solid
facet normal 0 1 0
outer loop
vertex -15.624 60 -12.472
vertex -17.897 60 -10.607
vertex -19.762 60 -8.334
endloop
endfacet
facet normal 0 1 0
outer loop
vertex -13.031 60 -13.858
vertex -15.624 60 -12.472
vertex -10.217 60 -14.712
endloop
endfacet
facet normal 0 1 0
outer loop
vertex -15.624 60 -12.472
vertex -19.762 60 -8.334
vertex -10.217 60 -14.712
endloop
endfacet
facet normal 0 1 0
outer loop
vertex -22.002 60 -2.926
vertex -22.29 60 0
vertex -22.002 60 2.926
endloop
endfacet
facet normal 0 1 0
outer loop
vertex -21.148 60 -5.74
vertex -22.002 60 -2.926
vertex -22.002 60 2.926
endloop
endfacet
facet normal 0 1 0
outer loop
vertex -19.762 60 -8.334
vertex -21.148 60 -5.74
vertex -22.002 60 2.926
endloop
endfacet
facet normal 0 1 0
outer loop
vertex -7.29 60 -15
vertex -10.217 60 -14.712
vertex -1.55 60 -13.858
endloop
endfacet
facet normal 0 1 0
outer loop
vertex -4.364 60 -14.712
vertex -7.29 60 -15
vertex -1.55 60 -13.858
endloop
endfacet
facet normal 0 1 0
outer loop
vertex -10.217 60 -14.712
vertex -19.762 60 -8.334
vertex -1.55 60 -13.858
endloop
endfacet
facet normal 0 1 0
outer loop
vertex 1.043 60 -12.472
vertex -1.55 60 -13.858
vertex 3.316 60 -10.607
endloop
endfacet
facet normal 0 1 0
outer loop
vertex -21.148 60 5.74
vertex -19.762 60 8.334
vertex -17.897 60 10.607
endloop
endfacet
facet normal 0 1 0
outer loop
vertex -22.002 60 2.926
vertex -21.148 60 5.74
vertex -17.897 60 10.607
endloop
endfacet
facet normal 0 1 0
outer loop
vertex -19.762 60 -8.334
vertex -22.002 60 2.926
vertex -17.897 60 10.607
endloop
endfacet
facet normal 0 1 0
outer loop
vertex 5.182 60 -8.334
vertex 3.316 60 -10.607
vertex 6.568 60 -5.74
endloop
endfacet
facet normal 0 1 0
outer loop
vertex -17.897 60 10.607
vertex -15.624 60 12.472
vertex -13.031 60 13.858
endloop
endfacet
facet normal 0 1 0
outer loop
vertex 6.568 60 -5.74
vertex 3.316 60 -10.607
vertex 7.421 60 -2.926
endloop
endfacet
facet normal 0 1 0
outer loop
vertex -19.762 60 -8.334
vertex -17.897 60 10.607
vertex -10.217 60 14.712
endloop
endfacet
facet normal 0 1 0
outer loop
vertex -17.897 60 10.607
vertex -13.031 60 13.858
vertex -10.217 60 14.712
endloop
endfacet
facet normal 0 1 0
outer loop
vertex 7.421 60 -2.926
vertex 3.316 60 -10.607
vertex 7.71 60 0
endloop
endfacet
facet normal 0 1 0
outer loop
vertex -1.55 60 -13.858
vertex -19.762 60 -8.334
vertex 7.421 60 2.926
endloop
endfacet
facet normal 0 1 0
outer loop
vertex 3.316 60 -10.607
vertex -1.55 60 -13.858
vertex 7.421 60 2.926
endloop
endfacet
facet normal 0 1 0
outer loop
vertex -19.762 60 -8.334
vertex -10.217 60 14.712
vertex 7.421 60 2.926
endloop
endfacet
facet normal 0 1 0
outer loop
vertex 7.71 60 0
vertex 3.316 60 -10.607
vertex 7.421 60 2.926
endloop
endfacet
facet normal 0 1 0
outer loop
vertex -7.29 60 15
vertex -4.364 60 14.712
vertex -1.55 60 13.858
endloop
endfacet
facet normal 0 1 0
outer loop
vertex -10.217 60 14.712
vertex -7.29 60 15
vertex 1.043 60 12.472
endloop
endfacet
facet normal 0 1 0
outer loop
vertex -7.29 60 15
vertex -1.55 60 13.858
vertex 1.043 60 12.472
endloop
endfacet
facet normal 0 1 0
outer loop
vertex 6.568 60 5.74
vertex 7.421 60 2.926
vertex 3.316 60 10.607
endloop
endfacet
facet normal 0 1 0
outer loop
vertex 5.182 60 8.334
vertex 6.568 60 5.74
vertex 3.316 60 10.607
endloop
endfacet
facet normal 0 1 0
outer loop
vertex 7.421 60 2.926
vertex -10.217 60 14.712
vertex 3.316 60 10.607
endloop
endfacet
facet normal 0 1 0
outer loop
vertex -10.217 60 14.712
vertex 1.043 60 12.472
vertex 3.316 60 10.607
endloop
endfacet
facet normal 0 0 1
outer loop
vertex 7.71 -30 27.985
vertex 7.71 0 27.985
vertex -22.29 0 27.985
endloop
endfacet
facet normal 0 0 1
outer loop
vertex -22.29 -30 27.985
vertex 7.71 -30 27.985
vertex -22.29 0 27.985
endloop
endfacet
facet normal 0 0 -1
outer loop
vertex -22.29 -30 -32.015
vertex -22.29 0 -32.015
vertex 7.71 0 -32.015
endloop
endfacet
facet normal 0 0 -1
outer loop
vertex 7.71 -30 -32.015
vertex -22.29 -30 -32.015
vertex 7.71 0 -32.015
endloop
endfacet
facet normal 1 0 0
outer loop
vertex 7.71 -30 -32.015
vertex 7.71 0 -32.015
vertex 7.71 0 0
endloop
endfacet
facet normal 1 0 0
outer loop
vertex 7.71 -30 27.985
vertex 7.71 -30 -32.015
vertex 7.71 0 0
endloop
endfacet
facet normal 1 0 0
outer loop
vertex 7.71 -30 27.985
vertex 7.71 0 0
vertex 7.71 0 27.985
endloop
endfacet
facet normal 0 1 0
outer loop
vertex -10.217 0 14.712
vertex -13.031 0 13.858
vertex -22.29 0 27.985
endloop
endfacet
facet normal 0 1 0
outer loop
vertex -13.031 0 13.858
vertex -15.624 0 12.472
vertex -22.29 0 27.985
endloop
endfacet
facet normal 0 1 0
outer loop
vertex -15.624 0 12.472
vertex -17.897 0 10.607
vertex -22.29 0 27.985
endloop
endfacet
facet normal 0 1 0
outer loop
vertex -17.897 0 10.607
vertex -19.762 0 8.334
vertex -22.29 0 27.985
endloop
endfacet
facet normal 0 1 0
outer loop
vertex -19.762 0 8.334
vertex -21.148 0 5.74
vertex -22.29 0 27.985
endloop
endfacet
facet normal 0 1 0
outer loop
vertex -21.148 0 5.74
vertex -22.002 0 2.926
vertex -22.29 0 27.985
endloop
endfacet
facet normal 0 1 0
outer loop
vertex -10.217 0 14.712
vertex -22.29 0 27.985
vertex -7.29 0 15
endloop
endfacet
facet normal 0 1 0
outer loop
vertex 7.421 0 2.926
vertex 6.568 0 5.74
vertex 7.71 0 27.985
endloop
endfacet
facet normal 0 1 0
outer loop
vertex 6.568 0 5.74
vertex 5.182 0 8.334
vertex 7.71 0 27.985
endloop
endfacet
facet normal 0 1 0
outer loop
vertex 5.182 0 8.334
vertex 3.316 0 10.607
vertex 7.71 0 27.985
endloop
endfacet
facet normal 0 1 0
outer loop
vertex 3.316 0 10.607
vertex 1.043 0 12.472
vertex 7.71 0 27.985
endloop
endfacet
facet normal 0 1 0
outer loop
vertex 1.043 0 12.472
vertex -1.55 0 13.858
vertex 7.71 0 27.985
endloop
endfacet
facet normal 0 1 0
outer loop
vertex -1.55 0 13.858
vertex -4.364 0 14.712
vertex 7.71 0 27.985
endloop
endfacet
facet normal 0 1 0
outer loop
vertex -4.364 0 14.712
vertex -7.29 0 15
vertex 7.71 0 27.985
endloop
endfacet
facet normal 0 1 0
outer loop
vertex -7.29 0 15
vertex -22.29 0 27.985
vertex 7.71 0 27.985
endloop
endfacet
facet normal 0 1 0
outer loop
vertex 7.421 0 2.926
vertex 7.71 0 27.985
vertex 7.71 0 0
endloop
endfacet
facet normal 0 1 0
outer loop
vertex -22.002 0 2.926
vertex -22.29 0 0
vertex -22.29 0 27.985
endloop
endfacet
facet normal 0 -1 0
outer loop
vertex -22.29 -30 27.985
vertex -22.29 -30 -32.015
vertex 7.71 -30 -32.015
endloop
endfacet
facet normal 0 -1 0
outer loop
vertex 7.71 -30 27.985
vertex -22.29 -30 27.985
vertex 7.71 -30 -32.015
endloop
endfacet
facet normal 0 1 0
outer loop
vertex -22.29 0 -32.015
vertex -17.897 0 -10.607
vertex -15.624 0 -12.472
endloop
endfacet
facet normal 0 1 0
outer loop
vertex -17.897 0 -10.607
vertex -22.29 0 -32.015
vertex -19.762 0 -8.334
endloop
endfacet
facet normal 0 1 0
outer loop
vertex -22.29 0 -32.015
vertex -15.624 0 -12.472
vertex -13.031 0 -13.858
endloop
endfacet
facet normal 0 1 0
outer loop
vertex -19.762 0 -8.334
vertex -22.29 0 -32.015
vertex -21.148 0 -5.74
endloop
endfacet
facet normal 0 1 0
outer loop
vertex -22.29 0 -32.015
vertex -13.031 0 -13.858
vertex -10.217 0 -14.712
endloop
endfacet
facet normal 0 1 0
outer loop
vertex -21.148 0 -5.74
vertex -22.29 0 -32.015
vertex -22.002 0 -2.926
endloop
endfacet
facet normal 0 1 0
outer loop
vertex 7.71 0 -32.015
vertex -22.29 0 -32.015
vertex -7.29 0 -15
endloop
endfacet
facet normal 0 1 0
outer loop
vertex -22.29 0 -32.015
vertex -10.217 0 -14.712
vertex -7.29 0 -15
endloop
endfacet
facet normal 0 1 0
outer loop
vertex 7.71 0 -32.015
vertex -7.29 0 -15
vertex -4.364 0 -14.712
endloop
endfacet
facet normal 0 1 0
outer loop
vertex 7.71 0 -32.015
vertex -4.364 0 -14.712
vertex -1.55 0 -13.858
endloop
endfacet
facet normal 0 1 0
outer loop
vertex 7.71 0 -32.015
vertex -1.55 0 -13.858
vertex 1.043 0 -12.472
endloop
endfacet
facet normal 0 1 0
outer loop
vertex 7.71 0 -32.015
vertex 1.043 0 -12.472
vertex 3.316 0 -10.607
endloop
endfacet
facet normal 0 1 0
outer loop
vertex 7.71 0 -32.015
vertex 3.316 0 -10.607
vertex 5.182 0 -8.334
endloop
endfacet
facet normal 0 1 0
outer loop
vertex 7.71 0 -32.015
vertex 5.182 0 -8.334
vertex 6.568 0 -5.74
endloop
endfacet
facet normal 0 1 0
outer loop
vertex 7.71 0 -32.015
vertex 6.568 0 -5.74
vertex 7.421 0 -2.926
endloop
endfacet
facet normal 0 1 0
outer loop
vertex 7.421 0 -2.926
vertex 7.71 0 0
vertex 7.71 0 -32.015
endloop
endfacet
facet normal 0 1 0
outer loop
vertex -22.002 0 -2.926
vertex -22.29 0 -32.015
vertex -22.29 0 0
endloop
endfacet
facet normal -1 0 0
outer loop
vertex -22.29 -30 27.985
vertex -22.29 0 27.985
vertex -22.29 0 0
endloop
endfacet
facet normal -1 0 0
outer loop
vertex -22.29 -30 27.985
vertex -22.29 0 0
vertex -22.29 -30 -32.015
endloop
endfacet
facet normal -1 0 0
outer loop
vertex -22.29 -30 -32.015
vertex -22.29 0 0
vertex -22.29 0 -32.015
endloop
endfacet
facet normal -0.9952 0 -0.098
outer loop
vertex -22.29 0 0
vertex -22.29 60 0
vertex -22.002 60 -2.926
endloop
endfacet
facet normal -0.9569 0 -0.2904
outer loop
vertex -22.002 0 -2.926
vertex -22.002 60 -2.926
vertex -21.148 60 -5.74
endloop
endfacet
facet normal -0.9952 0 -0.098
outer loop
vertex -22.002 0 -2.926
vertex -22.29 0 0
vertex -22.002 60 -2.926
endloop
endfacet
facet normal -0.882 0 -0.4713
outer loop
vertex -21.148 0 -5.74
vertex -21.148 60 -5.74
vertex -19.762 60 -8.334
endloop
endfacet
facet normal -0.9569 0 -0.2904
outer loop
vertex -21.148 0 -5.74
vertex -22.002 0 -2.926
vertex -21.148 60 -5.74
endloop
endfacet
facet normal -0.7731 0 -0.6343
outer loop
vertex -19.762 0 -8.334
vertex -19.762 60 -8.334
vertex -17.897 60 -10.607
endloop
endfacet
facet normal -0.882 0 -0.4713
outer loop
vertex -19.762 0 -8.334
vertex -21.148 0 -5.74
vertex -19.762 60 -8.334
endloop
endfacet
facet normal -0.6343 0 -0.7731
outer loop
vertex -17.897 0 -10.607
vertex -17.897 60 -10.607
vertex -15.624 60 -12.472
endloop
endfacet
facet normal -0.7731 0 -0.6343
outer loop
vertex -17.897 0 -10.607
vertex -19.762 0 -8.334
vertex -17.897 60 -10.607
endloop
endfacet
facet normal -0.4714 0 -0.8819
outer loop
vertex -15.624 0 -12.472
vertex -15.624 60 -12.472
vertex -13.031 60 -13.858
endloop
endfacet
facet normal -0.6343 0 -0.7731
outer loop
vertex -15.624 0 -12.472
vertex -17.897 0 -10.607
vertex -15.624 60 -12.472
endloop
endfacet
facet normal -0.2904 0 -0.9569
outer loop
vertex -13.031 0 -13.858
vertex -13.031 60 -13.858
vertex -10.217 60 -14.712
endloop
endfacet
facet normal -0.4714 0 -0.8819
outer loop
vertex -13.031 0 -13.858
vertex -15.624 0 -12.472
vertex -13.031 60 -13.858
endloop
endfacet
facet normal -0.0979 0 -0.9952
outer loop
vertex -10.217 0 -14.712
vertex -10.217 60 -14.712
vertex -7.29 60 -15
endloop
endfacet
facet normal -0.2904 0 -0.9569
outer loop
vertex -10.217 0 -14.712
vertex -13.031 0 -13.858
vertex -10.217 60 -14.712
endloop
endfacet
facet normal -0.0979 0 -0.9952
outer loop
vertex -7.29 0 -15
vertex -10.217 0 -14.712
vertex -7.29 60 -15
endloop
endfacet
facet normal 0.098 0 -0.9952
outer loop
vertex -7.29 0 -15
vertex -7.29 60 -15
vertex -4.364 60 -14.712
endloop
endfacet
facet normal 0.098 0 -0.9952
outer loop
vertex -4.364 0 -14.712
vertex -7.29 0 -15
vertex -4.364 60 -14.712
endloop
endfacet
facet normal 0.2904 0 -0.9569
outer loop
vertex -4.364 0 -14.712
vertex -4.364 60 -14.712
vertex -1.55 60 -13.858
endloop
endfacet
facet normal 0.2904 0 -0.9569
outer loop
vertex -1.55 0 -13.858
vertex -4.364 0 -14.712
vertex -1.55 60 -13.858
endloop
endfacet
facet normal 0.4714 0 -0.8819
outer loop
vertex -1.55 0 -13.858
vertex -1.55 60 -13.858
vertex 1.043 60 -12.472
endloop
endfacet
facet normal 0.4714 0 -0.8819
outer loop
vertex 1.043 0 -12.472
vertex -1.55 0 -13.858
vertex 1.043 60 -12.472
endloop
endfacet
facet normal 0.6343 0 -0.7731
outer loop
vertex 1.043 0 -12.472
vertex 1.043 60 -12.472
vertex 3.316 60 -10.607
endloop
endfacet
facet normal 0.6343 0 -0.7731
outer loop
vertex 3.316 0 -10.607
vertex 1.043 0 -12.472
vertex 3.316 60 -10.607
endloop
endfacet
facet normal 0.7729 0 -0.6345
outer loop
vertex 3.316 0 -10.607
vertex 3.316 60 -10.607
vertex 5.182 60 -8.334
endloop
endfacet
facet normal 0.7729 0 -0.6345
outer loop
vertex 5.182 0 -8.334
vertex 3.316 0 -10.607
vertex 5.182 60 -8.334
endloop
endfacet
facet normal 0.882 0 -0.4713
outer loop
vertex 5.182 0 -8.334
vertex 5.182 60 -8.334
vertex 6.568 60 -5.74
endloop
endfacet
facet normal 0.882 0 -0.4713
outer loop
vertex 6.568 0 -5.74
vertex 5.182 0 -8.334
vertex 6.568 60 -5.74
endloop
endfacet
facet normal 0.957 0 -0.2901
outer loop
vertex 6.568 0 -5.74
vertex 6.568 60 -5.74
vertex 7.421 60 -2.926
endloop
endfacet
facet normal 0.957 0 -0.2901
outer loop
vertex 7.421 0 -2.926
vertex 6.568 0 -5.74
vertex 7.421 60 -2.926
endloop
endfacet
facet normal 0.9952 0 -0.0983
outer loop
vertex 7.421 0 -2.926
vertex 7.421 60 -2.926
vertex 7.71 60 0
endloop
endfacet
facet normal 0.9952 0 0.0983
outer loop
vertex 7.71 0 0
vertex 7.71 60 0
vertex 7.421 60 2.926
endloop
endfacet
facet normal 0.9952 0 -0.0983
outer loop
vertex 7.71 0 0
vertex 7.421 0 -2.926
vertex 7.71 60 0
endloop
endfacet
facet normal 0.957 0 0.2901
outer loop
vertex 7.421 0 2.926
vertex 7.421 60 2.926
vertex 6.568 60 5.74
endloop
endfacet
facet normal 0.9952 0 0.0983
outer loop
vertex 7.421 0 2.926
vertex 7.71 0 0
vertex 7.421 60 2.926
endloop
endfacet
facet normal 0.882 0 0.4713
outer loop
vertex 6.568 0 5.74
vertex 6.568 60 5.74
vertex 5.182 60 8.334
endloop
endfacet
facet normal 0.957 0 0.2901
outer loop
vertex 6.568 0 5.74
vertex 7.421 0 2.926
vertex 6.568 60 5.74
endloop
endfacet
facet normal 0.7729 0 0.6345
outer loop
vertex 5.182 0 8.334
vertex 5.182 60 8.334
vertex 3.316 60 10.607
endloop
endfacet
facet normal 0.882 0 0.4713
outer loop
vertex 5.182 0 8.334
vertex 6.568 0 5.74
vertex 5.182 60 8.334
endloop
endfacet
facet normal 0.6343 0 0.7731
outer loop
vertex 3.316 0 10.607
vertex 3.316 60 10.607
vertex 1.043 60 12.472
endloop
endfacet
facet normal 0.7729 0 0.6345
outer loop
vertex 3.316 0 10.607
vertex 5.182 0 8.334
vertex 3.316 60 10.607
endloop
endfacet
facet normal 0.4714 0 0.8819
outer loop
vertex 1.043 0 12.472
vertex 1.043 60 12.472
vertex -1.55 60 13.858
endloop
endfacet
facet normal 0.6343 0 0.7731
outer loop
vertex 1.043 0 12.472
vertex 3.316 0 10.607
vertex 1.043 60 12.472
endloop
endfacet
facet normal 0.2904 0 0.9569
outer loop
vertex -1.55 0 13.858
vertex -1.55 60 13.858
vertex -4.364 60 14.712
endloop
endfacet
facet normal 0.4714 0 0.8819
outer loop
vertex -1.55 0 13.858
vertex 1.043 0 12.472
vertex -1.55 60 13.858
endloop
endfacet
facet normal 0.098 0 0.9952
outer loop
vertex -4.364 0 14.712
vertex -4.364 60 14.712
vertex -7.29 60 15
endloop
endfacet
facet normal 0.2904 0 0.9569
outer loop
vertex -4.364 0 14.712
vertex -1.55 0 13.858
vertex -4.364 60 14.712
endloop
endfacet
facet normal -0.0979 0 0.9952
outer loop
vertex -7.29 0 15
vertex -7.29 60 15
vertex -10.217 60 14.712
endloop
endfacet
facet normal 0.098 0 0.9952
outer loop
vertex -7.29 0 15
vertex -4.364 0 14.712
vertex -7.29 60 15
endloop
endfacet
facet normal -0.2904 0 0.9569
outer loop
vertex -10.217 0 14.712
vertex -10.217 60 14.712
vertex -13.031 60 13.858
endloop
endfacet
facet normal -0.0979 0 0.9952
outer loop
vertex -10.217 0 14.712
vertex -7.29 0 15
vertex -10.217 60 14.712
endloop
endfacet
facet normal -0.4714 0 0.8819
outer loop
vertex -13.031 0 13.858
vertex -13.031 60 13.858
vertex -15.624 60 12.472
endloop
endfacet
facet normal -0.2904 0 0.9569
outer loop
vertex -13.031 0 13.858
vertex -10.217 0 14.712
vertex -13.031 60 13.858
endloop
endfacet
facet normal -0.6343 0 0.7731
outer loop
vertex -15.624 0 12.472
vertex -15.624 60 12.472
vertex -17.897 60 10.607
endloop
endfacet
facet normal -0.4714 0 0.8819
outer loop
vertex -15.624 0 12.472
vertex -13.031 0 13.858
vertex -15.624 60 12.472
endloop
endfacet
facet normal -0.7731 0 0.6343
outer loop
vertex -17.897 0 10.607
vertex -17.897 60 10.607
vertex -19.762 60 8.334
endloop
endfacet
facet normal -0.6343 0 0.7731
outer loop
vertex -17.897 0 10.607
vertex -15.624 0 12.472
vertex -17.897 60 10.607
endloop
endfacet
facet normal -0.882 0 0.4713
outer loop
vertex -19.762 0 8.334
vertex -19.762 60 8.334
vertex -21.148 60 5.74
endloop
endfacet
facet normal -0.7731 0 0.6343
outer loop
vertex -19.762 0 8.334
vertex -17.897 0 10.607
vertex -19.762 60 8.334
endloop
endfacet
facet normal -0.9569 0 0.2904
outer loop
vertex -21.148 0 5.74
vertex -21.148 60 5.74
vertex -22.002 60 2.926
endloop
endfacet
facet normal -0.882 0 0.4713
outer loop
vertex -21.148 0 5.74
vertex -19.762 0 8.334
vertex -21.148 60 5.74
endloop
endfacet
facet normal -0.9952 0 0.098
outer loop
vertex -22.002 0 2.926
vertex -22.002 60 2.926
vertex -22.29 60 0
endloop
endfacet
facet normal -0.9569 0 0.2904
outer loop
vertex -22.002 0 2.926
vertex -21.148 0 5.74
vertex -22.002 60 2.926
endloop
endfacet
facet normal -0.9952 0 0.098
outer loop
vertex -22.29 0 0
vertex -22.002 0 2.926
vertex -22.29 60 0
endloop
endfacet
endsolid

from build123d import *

# Parameters (mm, degrees)
F1_DEPTH = 30
F2_DEPTH = 60


with BuildPart() as f1:
    # F0 (on Front) → F1 (new body)
    with BuildSketch(Plane.XZ):
        with BuildLine():
            Line((7.7097149414, 27.9853592813), (-22.2902850586, 27.9853592813))
            Line((-22.2902850586, 27.9853592813), (-22.2902850586, 6.68e-08))
            ThreePointArc((-22.2902850586, 6.68e-08), (-7.2902850252, 15), (7.7097149414, 0))
            Line((7.7097149414, 0), (7.7097149414, 27.9853592813))
        make_face()
        with BuildLine():
            ThreePointArc((7.7097149414, 0), (-7.290285092, -15), (-22.2902850586, 6.68e-08))
            Line((-22.2902850586, 6.68e-08), (-22.2902850586, -32.0146407187))
            Line((-22.2902850586, -32.0146407187), (7.7097149414, -32.0146407187))
            Line((7.7097149414, -32.0146407187), (7.7097149414, 0))
        make_face()
        with BuildLine():
            ThreePointArc((7.7097149414, 0), (-7.2902850252, 15), (-22.2902850586, 6.68e-08))
            ThreePointArc((-22.2902850586, 6.68e-08), (-7.290285092, -15), (7.7097149414, 0))
        make_face()
    extrude(amount=F1_DEPTH)

    # F0 (on Front) → F2 (join)
    with BuildSketch(Plane.XZ):
        with BuildLine():
            ThreePointArc((7.7097149414, 0), (-7.2902850252, 15), (-22.2902850586, 6.68e-08))
            ThreePointArc((-22.2902850586, 6.68e-08), (-7.290285092, -15), (7.7097149414, 0))
        make_face()
    extrude(amount=-F2_DEPTH)


solid = f1.part
